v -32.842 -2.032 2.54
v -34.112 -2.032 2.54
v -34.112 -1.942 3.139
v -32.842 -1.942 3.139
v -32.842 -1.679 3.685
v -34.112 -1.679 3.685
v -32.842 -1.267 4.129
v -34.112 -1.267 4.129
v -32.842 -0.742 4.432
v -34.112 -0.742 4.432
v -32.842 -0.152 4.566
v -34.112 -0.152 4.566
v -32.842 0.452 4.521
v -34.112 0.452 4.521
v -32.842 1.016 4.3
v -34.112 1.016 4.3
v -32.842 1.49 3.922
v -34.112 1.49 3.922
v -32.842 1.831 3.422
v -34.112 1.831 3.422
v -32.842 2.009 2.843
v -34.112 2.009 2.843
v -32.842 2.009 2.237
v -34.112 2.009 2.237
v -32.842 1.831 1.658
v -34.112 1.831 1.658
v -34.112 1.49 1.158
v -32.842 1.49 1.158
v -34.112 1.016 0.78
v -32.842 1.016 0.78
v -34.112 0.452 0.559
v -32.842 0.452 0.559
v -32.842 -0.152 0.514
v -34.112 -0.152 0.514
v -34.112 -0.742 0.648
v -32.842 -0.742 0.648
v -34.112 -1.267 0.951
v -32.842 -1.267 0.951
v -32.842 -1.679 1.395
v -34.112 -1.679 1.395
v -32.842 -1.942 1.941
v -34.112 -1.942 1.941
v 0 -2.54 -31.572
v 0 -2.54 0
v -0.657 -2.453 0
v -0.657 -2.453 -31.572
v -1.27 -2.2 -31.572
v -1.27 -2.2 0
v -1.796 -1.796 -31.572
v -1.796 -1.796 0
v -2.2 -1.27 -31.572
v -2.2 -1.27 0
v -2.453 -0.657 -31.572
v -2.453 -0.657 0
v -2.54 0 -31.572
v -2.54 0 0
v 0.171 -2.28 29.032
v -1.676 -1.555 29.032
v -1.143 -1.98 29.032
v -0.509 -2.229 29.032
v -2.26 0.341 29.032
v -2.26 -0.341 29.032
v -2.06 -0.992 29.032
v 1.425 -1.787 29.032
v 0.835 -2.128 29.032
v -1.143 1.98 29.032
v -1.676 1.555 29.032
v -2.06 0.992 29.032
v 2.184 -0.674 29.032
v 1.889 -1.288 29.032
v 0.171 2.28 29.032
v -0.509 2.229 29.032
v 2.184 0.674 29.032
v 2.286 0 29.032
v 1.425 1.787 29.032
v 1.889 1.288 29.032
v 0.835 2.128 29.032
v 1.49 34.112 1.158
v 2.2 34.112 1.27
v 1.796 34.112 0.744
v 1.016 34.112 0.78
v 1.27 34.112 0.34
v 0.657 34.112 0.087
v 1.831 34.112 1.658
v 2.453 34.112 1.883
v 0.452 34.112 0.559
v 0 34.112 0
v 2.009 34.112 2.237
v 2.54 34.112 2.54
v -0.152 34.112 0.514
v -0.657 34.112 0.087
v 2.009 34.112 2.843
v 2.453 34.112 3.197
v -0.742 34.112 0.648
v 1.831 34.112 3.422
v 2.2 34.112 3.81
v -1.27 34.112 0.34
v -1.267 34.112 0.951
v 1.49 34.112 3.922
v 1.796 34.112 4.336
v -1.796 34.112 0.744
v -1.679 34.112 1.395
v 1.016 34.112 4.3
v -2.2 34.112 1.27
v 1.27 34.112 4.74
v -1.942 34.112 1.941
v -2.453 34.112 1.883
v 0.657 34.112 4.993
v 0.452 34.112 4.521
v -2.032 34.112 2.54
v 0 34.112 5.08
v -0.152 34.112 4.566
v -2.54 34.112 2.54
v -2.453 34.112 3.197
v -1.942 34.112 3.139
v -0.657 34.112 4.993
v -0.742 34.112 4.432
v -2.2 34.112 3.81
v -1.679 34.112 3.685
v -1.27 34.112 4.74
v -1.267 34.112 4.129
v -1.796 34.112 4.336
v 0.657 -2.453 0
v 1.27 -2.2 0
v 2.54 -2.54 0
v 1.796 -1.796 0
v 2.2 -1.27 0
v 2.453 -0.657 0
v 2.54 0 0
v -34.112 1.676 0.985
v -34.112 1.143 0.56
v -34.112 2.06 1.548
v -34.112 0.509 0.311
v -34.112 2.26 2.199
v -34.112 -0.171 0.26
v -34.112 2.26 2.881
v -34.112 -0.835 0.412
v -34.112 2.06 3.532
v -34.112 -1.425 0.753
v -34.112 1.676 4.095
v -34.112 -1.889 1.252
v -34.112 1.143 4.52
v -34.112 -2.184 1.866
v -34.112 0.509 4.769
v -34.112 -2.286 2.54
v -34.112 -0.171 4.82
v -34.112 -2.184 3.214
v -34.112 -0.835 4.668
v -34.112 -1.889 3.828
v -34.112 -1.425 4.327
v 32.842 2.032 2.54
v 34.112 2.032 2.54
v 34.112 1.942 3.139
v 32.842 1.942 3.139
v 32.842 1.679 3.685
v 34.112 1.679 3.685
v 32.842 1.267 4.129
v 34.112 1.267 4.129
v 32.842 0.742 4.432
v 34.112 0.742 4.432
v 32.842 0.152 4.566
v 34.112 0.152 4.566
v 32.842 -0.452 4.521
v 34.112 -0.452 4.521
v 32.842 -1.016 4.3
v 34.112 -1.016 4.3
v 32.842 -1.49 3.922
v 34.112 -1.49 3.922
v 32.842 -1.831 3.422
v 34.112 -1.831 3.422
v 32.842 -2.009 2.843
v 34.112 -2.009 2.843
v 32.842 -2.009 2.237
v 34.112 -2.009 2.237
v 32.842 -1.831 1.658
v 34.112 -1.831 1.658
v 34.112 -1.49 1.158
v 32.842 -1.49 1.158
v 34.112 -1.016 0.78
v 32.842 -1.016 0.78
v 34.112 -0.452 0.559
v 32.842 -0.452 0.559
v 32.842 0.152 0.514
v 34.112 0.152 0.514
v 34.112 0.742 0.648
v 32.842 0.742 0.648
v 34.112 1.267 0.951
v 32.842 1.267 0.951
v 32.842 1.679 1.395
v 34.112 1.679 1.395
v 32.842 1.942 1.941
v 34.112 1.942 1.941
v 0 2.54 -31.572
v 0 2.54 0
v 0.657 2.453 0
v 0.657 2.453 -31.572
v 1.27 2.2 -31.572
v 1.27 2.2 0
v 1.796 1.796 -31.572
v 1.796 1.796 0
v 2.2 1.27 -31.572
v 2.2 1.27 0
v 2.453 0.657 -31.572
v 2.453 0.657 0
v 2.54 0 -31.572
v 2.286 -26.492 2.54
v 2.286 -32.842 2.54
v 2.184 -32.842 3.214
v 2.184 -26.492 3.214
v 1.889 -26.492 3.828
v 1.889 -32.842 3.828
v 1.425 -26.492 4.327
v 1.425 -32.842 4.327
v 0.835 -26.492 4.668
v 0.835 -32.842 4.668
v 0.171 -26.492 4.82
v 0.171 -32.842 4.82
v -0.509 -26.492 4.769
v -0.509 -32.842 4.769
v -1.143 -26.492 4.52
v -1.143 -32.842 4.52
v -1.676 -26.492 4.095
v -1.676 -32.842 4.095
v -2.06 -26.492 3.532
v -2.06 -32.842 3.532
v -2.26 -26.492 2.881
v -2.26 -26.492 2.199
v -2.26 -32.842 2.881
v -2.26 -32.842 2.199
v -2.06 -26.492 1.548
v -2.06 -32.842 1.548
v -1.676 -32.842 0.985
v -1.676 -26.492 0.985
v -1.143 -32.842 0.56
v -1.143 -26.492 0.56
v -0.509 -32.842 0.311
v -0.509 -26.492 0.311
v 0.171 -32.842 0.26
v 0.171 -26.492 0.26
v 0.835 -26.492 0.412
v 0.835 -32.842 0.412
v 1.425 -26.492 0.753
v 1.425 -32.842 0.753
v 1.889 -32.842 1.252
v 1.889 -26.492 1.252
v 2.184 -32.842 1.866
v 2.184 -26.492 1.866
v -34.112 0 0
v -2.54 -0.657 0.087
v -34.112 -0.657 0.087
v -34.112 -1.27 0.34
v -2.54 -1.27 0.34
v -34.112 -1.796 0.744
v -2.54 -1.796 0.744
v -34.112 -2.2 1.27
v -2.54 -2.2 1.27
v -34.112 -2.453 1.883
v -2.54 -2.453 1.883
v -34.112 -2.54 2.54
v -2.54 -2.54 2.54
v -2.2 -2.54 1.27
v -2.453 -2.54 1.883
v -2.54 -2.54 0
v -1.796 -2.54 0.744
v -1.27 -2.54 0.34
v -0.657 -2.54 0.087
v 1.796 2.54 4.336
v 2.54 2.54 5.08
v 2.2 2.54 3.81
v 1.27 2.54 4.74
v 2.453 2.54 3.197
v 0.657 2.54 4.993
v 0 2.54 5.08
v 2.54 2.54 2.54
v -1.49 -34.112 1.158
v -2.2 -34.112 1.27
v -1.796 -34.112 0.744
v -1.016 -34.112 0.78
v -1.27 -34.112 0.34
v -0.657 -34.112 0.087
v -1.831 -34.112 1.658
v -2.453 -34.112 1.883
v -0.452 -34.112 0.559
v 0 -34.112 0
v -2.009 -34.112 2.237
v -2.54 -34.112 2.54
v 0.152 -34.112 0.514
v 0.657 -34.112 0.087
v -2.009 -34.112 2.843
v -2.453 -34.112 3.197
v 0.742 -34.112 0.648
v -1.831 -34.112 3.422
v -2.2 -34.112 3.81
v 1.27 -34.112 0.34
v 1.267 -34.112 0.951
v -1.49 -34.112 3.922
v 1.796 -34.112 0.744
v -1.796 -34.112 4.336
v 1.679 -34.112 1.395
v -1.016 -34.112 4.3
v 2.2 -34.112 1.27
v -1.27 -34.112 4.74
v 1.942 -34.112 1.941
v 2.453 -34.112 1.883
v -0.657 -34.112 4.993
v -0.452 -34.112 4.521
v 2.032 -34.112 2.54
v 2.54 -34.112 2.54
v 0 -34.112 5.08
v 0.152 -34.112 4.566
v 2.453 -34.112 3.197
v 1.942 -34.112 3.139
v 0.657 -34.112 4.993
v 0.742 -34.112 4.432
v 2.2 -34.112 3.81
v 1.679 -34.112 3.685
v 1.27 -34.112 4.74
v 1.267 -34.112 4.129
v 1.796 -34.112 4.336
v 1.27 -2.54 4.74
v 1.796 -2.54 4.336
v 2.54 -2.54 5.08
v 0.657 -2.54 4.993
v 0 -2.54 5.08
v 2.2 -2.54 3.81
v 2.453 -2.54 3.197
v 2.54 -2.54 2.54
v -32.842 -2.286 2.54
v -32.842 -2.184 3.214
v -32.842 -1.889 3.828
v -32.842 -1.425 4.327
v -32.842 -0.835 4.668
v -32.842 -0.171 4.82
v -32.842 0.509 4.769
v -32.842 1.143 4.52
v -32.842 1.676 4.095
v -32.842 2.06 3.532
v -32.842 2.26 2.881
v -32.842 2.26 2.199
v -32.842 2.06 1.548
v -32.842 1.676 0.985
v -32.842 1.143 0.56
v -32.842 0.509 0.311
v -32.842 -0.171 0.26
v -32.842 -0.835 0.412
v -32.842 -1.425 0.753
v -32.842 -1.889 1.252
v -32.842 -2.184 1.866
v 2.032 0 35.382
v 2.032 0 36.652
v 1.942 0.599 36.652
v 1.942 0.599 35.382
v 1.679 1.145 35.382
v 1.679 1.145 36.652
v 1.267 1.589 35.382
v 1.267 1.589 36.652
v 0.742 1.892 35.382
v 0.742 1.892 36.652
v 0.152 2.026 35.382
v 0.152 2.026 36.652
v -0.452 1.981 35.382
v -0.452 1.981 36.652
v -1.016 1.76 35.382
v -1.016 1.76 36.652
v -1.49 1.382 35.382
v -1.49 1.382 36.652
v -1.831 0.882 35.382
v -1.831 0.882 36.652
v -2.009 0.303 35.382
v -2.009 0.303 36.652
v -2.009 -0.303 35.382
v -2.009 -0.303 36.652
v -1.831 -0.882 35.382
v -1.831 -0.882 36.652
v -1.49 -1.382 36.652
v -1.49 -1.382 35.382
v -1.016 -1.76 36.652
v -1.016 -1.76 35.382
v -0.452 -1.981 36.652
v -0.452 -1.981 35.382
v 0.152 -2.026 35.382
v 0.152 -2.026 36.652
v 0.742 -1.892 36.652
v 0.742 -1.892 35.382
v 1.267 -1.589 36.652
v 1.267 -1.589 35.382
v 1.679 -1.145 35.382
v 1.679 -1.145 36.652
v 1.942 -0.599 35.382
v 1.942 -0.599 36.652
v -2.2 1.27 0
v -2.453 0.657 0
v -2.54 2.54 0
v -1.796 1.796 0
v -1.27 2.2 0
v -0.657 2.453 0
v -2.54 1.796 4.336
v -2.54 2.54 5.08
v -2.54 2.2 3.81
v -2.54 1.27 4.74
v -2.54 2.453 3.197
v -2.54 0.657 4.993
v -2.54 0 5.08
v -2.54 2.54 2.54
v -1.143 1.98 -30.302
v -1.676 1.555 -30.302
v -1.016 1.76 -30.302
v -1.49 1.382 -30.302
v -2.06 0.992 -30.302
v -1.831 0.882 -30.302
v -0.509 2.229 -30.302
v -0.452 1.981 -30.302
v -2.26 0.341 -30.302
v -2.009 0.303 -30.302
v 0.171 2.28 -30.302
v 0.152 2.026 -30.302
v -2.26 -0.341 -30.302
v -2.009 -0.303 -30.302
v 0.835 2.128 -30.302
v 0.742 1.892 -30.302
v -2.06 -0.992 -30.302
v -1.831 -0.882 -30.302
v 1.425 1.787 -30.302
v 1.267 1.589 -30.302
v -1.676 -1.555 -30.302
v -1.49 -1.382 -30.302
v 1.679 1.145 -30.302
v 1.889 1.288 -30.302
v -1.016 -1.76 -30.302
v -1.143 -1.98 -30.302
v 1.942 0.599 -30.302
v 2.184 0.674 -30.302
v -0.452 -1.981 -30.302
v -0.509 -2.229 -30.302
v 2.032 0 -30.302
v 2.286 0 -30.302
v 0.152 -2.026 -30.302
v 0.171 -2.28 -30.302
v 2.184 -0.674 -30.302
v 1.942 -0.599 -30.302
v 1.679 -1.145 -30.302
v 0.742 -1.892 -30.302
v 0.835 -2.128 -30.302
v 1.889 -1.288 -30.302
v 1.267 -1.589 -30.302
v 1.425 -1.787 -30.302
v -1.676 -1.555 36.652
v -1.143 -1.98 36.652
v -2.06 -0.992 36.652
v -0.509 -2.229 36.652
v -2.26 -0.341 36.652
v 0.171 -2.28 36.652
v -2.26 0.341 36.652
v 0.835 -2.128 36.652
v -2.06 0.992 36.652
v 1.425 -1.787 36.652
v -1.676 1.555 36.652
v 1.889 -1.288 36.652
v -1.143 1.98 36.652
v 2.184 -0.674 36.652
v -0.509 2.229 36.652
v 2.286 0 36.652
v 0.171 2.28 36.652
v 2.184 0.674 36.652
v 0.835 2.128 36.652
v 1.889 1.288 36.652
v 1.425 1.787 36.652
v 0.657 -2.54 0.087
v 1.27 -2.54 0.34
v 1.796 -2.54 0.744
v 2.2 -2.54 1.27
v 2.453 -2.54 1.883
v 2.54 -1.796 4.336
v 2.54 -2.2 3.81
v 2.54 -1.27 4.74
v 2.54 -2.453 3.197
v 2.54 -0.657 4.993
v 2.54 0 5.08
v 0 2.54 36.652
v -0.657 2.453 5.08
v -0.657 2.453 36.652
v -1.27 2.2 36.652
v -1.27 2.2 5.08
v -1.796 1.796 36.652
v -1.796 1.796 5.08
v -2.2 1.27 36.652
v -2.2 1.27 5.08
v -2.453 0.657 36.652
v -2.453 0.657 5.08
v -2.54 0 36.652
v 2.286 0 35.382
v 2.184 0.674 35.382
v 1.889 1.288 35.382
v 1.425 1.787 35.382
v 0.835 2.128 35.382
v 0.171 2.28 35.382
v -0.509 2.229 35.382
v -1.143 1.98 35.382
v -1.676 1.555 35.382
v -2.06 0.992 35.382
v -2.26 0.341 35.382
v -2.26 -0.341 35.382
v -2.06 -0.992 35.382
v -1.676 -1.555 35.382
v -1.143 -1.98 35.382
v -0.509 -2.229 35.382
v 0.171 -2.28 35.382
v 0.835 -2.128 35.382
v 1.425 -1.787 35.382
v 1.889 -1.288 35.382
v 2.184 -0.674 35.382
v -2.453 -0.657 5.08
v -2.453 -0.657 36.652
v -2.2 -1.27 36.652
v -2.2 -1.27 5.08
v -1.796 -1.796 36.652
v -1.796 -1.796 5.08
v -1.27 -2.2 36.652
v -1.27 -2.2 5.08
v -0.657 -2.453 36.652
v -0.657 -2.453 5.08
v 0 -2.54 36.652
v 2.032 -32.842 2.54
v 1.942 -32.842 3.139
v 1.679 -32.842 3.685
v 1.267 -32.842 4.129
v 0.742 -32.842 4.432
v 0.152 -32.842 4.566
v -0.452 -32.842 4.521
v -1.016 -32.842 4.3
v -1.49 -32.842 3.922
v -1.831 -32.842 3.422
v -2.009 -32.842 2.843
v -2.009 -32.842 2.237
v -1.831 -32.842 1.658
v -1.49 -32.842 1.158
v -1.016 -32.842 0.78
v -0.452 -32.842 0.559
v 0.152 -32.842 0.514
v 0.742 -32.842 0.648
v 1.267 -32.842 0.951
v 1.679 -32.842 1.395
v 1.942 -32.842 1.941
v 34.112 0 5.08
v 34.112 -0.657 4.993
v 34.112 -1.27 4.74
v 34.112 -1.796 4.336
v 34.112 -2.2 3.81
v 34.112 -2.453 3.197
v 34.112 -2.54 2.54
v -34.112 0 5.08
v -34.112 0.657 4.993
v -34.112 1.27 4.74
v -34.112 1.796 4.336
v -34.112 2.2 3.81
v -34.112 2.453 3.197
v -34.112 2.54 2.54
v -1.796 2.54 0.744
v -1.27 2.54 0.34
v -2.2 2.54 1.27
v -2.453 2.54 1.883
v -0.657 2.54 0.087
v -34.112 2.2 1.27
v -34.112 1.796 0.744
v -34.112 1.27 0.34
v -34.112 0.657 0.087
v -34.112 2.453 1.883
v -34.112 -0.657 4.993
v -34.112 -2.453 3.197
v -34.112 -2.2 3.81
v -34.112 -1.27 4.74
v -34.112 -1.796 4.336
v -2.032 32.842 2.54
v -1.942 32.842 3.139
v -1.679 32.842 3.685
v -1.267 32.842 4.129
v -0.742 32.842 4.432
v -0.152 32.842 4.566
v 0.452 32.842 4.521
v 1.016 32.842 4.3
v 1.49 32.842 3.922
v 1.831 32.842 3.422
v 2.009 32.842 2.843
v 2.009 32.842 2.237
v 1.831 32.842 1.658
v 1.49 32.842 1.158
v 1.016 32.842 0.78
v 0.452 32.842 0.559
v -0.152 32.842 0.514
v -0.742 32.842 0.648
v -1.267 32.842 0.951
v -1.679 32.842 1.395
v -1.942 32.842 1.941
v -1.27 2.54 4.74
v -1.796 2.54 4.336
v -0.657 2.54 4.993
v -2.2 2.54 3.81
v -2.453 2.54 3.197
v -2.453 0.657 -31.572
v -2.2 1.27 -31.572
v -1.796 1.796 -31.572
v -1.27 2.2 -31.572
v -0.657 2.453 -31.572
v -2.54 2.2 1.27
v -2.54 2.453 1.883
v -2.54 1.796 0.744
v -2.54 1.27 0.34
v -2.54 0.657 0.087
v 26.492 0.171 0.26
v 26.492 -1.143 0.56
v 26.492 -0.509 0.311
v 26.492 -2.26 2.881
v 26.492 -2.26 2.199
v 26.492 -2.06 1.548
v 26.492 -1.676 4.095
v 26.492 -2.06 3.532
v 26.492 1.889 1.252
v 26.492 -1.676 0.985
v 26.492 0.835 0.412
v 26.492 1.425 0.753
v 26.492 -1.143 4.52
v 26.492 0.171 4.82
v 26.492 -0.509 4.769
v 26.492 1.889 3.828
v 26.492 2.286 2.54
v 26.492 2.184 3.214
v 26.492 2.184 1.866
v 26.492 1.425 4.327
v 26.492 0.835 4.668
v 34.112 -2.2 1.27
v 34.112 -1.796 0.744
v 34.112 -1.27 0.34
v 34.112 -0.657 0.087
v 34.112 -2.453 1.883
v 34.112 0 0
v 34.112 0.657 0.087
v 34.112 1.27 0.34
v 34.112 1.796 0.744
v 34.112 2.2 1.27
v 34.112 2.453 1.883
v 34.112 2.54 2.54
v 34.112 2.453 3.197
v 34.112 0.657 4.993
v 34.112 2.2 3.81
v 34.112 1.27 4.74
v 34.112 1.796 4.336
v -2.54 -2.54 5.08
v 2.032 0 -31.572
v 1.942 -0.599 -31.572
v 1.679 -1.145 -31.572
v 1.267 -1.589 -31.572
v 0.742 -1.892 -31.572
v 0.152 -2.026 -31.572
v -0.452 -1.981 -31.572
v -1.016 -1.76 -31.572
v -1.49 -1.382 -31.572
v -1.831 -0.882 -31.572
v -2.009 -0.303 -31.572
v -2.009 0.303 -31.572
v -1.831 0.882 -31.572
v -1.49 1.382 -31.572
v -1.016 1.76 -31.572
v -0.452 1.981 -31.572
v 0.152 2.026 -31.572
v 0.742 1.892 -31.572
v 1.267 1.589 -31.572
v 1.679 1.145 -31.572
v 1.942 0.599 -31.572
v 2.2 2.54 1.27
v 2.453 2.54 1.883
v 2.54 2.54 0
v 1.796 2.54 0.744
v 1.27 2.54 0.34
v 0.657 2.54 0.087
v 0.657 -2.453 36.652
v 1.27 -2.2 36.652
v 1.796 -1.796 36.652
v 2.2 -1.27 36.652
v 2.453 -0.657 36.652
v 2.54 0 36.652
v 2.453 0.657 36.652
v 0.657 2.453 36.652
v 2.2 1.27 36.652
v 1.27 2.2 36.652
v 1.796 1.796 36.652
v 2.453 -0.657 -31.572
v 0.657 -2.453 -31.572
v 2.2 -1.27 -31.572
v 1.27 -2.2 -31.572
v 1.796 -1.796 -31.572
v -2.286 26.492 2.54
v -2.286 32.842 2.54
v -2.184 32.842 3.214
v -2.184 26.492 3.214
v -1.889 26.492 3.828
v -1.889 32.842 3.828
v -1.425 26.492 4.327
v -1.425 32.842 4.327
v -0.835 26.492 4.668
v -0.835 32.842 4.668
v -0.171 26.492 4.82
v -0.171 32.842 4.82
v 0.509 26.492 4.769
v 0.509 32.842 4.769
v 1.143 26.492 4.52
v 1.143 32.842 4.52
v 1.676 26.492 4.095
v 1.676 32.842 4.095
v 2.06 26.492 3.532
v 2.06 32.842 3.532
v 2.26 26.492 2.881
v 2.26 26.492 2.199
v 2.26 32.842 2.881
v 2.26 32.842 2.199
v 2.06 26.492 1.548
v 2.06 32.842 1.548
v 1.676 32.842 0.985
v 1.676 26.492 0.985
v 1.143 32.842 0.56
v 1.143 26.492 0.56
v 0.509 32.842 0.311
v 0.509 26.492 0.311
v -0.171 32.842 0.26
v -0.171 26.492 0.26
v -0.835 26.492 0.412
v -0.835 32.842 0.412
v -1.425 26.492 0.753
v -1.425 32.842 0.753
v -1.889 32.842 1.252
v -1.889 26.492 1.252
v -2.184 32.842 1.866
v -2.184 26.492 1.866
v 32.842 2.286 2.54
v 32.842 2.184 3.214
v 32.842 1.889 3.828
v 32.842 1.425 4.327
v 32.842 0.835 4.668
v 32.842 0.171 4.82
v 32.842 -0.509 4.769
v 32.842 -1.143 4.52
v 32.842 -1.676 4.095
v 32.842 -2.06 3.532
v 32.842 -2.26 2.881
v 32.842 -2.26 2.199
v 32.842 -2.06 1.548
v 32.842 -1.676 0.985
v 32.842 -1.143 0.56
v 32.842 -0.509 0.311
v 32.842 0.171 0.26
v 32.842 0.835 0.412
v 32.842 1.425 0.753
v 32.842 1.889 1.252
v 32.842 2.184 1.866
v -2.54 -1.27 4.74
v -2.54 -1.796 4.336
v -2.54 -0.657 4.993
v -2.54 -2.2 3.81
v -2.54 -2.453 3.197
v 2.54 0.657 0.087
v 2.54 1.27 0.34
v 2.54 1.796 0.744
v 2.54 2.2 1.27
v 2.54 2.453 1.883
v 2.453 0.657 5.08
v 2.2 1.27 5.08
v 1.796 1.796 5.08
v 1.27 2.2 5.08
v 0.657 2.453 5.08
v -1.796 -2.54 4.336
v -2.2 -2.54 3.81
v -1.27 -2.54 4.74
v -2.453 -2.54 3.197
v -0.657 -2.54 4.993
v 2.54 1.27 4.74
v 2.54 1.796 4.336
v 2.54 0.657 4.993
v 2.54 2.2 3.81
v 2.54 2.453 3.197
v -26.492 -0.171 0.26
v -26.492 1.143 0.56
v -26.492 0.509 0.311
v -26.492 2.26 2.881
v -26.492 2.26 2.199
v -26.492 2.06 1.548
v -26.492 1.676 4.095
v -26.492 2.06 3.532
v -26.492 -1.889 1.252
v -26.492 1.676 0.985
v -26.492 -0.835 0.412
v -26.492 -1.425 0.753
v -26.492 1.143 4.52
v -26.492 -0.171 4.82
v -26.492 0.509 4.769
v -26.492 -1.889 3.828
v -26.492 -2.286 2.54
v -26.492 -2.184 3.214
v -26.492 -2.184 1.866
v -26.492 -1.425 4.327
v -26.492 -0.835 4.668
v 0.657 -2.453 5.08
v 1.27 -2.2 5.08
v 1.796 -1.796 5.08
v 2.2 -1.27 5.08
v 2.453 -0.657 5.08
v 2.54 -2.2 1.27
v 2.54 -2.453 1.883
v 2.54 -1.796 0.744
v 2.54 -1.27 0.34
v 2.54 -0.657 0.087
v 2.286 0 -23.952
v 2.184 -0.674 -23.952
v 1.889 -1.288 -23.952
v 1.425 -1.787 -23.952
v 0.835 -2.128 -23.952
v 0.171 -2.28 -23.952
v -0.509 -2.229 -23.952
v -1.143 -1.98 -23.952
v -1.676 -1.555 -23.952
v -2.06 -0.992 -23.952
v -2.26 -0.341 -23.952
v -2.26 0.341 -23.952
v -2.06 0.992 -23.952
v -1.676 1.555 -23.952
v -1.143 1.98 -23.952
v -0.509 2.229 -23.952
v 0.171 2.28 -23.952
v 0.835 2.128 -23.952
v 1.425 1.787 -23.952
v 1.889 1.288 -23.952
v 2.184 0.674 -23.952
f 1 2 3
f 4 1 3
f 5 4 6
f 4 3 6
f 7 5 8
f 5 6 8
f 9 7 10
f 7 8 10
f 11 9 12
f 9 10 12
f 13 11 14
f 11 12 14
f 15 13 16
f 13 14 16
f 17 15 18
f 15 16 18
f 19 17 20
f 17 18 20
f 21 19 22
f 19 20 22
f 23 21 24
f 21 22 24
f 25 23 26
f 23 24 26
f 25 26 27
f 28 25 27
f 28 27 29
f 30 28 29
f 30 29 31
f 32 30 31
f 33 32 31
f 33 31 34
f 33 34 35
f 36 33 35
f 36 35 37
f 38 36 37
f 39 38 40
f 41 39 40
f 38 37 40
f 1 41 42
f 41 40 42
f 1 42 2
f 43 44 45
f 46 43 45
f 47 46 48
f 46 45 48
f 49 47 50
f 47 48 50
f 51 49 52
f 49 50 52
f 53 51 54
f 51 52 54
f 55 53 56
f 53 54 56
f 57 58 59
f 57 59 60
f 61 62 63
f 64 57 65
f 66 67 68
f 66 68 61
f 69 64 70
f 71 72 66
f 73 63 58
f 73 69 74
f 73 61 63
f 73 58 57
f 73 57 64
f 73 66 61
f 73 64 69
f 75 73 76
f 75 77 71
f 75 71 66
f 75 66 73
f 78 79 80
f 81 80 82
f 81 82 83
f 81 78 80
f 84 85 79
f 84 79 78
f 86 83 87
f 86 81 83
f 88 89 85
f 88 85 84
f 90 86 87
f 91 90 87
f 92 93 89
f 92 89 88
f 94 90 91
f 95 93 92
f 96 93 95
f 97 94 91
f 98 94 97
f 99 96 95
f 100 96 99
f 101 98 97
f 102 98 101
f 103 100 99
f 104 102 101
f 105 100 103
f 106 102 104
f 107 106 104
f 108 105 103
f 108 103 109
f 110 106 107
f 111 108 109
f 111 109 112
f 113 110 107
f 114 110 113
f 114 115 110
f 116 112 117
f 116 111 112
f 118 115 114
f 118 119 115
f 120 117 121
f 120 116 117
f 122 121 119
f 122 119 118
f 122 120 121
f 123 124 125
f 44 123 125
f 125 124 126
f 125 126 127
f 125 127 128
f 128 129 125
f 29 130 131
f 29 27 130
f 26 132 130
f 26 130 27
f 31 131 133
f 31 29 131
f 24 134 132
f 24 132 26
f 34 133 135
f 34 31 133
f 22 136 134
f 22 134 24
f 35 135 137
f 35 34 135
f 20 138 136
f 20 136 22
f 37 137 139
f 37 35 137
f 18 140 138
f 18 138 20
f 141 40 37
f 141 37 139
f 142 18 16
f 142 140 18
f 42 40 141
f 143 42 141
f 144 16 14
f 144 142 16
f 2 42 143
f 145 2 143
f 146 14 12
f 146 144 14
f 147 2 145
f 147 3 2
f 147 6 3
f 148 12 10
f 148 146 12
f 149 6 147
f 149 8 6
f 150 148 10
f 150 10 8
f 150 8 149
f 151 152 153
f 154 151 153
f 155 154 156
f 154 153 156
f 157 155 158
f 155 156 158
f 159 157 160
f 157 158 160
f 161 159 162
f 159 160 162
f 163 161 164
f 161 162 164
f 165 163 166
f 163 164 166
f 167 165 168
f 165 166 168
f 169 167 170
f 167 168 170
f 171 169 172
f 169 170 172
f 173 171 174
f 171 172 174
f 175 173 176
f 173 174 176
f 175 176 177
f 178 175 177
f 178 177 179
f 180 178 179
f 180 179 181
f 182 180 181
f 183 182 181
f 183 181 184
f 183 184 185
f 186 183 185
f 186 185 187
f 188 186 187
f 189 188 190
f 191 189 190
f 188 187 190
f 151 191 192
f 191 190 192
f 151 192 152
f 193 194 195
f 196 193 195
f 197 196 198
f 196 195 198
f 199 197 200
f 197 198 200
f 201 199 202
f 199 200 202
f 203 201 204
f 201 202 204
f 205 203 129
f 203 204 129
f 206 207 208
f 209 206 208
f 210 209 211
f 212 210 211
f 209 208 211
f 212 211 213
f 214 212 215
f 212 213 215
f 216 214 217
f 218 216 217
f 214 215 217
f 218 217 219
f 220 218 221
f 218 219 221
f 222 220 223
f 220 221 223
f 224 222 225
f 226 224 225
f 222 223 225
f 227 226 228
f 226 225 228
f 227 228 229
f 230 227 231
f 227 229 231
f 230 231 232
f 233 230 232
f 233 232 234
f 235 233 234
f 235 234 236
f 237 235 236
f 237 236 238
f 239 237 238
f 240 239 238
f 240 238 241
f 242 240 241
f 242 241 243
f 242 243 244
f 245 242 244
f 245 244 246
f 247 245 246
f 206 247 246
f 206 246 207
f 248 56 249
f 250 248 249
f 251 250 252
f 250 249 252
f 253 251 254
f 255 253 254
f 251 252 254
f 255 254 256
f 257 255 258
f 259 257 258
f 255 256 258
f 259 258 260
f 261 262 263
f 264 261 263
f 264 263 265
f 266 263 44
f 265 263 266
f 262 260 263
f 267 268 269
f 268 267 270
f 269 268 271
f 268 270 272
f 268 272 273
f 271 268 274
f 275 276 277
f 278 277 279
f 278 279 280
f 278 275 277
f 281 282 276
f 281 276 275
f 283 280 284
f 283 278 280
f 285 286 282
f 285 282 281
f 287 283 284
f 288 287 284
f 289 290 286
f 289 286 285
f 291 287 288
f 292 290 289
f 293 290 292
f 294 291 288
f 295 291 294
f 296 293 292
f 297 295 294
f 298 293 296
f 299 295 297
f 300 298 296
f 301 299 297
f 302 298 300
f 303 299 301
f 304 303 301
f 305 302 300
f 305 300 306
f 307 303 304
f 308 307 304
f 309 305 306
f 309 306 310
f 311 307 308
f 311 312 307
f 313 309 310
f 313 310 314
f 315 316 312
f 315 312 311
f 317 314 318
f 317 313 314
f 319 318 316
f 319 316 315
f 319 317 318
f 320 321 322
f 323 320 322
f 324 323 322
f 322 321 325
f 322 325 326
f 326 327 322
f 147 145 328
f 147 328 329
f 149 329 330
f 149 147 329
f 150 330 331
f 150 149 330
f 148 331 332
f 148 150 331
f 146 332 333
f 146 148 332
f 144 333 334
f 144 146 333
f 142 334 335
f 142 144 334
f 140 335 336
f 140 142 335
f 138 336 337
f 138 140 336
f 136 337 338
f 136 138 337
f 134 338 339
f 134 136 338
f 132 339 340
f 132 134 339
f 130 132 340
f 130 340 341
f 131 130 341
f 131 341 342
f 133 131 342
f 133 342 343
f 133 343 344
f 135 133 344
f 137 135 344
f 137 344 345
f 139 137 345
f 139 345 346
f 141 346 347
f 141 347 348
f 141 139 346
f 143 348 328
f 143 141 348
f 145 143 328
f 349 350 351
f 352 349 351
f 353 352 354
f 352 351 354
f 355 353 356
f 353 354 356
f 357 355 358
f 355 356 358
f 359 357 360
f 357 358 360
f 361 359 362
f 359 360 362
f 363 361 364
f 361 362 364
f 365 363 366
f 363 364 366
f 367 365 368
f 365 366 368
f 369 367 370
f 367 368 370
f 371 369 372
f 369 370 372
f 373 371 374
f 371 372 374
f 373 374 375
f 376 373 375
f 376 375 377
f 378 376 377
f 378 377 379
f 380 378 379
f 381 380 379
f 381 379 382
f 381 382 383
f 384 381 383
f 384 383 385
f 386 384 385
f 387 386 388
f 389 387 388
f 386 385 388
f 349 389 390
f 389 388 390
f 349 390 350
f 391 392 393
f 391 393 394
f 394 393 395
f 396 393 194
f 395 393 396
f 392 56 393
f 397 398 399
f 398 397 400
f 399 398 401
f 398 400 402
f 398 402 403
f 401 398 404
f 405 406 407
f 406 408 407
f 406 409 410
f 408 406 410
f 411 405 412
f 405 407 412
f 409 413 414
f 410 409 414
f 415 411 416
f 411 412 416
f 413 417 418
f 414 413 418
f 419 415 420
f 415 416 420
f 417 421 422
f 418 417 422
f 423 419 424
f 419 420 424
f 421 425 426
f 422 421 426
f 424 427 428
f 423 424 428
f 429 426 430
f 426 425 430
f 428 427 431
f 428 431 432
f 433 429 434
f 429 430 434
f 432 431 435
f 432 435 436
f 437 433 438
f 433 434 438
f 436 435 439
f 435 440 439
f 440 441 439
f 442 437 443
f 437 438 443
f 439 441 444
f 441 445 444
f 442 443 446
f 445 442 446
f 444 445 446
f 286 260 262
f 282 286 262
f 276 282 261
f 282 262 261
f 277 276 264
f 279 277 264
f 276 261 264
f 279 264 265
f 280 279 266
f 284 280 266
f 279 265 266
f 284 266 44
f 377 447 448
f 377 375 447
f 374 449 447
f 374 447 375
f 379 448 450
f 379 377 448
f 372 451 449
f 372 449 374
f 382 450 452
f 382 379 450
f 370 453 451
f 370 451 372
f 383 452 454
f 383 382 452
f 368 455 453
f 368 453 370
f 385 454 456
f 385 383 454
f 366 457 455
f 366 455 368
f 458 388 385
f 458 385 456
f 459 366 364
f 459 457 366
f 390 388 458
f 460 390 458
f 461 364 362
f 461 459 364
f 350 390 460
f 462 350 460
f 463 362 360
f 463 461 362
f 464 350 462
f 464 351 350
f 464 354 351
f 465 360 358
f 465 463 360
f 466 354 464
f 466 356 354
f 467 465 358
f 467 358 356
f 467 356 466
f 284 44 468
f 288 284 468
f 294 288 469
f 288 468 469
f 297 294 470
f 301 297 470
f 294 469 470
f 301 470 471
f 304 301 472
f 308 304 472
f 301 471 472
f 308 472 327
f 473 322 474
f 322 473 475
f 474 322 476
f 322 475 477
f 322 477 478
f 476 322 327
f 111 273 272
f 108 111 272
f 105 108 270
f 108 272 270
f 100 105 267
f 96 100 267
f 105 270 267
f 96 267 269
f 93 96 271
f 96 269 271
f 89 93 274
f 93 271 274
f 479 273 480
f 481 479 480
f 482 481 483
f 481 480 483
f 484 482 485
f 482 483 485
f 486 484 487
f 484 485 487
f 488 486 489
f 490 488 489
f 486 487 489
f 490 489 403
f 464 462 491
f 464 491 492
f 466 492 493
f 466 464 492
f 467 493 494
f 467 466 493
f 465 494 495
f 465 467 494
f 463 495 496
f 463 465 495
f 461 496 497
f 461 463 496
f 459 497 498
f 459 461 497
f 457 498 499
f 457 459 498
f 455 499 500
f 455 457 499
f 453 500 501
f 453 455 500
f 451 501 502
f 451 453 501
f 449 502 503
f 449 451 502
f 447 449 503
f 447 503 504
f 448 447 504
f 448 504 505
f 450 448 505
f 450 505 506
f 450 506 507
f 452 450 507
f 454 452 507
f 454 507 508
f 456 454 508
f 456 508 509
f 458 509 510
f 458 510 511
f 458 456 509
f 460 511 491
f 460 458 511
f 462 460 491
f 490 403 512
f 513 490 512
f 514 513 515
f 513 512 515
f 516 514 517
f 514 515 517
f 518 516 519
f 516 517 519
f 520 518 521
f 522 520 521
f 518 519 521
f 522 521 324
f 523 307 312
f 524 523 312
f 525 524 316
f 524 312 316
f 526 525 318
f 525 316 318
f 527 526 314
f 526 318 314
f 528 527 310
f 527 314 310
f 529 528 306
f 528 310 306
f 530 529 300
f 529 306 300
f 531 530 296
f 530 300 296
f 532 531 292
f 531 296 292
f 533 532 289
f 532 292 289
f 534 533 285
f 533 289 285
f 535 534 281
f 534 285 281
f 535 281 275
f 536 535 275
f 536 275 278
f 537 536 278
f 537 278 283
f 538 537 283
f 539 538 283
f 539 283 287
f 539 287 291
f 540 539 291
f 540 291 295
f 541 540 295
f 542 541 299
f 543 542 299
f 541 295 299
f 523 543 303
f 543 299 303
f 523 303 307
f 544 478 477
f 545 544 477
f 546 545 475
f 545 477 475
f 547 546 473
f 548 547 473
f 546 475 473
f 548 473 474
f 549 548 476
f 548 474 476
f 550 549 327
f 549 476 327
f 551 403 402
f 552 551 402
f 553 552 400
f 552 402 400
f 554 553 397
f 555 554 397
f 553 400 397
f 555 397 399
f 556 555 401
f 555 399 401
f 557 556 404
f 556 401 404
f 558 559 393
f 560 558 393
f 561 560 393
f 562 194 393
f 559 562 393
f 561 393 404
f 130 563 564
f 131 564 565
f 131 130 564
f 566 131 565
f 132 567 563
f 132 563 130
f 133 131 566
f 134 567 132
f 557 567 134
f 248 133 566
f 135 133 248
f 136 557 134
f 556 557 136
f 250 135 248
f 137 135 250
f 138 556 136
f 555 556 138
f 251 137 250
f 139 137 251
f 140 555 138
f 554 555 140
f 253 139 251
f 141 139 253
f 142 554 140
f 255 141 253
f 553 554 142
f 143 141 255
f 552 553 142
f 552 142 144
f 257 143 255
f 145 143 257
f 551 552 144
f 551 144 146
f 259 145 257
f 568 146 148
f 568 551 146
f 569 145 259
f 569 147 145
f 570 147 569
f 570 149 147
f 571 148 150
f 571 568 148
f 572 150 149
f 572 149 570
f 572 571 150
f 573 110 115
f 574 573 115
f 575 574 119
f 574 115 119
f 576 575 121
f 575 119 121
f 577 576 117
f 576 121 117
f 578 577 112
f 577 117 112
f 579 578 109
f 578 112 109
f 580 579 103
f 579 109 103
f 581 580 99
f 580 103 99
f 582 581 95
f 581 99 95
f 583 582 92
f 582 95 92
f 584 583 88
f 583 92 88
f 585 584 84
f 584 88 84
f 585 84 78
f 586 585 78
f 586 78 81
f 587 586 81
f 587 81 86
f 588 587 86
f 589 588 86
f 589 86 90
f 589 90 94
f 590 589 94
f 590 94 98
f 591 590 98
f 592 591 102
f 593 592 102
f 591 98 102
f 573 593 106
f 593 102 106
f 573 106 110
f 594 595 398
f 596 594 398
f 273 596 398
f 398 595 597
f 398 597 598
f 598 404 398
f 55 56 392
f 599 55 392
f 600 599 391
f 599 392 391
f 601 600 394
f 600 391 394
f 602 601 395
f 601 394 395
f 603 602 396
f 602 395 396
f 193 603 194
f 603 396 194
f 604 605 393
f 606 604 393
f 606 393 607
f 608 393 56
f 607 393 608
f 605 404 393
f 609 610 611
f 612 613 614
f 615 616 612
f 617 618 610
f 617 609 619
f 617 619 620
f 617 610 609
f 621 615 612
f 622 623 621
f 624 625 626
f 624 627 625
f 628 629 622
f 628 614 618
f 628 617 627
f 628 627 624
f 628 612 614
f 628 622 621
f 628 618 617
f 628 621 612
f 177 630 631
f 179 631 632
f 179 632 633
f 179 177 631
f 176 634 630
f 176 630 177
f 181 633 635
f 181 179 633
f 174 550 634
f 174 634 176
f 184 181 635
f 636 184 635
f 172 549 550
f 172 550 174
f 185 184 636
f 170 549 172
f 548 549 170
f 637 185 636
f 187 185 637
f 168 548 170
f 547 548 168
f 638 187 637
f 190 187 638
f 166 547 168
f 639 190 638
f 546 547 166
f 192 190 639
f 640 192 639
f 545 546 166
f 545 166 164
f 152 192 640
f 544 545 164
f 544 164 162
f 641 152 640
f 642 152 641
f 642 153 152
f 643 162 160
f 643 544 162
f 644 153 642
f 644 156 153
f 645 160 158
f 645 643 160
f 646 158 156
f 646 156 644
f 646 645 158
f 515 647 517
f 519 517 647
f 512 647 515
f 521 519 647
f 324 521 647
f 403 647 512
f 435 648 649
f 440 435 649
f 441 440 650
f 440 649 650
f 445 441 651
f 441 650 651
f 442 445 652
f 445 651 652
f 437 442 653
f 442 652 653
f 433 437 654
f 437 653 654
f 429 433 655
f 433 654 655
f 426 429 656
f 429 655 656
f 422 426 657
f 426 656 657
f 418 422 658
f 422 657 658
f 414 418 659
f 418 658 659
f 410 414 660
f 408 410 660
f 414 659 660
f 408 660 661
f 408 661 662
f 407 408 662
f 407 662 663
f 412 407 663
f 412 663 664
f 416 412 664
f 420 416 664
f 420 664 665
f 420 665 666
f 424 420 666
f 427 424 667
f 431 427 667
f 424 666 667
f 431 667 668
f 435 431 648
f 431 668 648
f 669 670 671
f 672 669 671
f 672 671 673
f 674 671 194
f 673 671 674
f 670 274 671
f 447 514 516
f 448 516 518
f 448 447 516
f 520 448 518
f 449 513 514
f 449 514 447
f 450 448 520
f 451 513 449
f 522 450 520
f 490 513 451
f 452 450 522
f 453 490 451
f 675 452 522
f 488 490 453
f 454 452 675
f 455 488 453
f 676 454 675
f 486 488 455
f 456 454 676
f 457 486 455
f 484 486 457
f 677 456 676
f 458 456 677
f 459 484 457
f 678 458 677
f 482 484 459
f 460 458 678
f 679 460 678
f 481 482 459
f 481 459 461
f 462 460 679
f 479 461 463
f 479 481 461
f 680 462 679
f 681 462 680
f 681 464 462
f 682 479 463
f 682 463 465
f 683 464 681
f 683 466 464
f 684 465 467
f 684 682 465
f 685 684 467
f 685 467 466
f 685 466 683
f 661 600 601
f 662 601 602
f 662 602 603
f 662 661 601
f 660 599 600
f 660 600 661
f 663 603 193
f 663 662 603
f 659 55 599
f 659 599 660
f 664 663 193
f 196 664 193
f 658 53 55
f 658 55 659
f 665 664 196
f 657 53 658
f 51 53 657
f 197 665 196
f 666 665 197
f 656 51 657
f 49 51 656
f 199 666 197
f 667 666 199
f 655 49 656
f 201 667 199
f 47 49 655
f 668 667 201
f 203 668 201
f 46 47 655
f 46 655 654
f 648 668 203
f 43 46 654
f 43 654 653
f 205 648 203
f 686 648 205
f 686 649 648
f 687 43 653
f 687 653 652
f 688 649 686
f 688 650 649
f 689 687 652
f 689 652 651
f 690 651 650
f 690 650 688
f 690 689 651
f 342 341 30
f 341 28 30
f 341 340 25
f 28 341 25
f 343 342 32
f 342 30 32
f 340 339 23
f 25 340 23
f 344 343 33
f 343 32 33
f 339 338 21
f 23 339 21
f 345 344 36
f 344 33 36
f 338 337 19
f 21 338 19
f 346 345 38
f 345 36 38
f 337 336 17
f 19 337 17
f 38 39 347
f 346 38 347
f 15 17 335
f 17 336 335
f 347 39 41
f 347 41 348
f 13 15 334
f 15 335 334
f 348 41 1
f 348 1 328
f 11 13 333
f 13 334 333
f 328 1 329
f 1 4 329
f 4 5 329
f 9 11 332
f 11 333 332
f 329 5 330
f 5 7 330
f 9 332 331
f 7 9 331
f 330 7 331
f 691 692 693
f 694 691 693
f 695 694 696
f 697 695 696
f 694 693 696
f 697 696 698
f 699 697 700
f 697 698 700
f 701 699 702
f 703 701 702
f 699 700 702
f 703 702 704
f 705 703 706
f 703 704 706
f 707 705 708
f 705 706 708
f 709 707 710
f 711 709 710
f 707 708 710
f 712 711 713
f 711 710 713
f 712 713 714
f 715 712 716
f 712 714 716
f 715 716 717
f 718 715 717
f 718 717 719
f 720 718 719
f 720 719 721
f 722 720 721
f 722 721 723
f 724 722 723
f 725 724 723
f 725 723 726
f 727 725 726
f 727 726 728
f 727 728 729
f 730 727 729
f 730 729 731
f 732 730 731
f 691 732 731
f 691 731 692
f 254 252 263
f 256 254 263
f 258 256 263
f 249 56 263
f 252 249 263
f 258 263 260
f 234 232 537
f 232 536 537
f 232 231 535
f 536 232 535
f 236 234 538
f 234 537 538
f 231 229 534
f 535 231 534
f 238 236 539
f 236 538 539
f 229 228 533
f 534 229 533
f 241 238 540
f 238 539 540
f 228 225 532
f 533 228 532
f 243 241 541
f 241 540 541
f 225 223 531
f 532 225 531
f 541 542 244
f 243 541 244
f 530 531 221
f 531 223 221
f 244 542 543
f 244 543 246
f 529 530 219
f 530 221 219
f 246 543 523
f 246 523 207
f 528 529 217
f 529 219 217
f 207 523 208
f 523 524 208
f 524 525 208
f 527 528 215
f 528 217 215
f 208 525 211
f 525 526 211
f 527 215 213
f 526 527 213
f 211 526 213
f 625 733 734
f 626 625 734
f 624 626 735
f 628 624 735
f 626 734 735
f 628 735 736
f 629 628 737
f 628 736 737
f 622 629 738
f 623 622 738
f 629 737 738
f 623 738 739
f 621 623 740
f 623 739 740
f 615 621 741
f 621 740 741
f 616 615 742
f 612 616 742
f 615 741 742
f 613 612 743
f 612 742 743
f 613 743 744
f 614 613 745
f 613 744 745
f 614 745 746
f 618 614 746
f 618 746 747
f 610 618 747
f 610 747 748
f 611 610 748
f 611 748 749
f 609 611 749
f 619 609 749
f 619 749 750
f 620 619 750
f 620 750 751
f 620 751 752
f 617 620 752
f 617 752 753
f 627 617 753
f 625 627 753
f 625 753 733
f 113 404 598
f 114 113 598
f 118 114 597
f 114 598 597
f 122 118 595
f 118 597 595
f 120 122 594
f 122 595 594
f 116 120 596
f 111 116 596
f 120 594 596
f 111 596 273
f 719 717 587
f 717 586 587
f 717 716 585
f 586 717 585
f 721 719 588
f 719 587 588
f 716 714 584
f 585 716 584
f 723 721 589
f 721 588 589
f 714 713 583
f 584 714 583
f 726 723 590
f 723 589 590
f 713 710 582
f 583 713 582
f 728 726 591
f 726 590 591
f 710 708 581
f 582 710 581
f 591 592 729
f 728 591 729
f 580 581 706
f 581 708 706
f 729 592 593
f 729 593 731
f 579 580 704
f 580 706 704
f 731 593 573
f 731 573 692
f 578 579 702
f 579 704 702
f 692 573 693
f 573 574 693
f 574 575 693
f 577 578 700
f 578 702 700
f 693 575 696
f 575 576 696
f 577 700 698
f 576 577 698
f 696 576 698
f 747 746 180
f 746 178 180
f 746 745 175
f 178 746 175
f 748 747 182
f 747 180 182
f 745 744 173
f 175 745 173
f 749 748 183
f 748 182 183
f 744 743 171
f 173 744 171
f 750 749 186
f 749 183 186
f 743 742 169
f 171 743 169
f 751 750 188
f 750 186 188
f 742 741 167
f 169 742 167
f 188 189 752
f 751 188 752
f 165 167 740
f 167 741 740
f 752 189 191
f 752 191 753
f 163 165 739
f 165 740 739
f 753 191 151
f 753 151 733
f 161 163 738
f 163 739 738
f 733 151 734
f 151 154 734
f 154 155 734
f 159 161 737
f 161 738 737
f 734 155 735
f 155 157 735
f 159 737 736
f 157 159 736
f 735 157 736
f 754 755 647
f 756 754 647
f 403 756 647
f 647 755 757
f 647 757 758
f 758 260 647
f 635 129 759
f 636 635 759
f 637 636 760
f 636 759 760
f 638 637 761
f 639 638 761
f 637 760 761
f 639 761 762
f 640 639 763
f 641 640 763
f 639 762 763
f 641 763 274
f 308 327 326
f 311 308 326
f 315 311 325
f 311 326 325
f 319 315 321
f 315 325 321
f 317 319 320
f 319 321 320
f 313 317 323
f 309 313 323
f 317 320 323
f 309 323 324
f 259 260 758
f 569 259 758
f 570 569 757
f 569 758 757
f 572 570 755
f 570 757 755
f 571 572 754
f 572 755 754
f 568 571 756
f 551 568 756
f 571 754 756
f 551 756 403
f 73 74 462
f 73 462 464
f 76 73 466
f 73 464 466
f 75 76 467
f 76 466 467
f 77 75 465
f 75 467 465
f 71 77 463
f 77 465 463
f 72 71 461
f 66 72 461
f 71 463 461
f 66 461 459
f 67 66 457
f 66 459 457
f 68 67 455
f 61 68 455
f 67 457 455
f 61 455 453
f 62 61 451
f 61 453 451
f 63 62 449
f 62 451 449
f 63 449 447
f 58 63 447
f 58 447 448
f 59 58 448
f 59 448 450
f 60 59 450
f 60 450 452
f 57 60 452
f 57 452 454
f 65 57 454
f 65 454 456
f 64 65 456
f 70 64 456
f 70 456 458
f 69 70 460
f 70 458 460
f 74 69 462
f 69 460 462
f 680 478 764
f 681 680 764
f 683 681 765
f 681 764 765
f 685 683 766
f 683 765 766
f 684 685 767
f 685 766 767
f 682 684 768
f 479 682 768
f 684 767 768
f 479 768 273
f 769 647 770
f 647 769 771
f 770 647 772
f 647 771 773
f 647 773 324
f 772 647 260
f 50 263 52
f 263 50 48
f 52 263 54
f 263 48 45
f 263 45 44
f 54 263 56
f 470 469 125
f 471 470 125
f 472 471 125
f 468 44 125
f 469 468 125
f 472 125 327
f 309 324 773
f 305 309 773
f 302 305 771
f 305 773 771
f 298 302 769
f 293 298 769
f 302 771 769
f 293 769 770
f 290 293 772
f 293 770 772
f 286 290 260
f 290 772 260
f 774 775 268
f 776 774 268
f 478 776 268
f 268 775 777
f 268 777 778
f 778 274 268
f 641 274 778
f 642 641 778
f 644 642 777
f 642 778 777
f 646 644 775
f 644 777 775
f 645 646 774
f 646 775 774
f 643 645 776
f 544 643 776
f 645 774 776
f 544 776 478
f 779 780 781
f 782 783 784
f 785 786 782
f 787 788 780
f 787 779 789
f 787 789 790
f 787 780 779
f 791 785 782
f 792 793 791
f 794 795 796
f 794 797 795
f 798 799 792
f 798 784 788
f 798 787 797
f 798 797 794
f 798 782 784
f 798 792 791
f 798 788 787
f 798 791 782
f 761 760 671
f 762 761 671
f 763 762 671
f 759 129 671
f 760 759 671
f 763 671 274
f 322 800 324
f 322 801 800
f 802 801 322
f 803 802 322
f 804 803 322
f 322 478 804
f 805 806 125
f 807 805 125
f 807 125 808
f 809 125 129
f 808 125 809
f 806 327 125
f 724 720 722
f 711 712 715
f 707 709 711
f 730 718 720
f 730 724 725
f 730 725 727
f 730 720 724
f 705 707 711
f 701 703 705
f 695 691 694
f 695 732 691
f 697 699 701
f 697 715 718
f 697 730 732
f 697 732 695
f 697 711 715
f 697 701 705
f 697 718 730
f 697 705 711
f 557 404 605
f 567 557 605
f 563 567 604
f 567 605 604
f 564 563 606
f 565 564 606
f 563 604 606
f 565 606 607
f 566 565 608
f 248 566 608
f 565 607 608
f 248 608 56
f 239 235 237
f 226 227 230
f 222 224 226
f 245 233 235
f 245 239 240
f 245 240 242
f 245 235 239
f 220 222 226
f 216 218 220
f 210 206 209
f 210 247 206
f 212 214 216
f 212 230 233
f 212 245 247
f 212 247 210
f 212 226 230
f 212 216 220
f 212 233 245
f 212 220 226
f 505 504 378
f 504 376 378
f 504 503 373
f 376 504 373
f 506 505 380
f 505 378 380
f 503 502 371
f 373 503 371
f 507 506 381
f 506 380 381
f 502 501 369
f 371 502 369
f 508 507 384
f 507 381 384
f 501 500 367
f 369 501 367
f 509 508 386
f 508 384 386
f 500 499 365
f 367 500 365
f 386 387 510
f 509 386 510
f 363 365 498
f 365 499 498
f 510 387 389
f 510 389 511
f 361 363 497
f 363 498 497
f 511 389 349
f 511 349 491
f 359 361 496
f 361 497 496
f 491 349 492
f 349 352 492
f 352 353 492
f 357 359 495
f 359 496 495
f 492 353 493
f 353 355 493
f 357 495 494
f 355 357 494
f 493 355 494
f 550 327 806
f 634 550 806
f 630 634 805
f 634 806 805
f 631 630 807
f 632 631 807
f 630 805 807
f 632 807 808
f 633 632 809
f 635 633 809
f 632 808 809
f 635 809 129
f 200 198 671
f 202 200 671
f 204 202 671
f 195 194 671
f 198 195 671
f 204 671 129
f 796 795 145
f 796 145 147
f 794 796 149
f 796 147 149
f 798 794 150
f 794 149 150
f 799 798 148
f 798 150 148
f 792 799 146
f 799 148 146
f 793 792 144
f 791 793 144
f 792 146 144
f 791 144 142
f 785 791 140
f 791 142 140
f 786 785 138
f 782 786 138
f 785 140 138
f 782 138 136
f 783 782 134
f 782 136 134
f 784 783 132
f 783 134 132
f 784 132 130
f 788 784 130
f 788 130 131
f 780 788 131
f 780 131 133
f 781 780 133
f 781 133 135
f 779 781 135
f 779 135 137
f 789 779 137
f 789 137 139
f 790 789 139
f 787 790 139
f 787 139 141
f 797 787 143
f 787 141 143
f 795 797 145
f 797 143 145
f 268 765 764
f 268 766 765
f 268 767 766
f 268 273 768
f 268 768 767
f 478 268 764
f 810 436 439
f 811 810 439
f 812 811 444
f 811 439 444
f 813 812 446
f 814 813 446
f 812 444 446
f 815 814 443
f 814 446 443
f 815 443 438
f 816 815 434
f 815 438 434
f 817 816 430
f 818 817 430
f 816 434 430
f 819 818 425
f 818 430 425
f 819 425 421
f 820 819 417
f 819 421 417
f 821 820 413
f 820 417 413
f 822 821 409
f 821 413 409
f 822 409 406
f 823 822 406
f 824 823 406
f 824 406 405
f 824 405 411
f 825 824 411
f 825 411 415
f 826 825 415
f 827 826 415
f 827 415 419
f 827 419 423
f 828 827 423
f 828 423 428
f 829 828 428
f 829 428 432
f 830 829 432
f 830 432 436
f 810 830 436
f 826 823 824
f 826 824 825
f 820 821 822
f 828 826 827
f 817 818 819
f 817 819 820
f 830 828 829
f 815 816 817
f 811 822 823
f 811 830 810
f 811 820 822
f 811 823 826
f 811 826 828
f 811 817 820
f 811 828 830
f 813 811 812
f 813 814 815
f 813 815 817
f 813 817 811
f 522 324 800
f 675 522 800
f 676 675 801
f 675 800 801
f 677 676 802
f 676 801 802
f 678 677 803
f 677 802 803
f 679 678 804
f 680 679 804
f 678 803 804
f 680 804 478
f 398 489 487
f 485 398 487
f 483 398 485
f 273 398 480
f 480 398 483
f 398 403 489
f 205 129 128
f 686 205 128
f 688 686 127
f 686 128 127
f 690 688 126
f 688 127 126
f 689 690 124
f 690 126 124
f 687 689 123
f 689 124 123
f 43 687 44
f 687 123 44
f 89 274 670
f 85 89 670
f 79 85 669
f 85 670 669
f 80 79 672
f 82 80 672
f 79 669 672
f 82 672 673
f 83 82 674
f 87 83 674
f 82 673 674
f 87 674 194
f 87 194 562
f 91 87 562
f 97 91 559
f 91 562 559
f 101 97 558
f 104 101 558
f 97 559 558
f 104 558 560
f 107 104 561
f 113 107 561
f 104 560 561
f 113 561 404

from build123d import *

# Parameters (mm, degrees)
F0_W      = 2.54
F0_H      = 2.54
F1_DEPTH  = 5.08
F8_DEPTH  = 31.5722
F9_R      = 2.286
F9_R_2    = 2.032
F10_DEPTH = 7.62
F11_DEPTH = 1.27
F12_DEPTH = 31.5722
F13_R     = 2.286
F13_R_2   = 2.032
F14_DEPTH = 7.62
F15_DEPTH = 1.27
F16_DEPTH = 31.5722
F17_R     = 2.286
F17_R_2   = 2.032
F18_DEPTH = 7.62
F19_DEPTH = 1.27
F20_DEPTH = 31.5722
F21_R     = 2.286
F21_R_2   = 2.032
F22_DEPTH = 7.62
F23_DEPTH = 1.27
F24_DEPTH = 31.5722
F25_R     = 2.286
F25_R_2   = 2.032
F26_DEPTH = 7.62
F27_DEPTH = 1.27
F28_DEPTH = 31.5722
F29_R     = 2.286
F29_R_2   = 2.032
F30_DEPTH = 7.62
F31_DEPTH = 1.27


with BuildPart() as f1:
    # F0 (on Top) → F1 (new body)
    with BuildSketch(Plane.XY):
        with Locations((-1.27, 1.27)):
            Rectangle(F0_W, F0_H)
        with Locations((1.27, 1.27)):
            Rectangle(F0_W, F0_H)
        Polygon((2.54, -2.54), (2.54, 0), (0, -2.54), align=None)
        Polygon((2.54, 0), (0, 0), (0, -2.54), align=None)
        with Locations((-1.27, -1.27)):
            Rectangle(F0_W, F0_H)
    extrude(amount=F1_DEPTH)

    # F7 (on face) → F8 (join)
    with BuildSketch(Plane(origin=(0, 0, 0), x_dir=(1, 0, 0), z_dir=(0, 0, -1))):
        with BuildLine():
            ThreePointArc((0, -2.54), (1.7960512242, -1.7960512242), (2.54, 0))
            ThreePointArc((2.54, 0), (1.7960512242, 1.7960512242), (0, 2.54))
            ThreePointArc((0, 2.54), (-1.7960512242, 1.7960512242), (-2.54, 0))
            ThreePointArc((-2.54, 0), (-1.7960512242, -1.7960512242), (0, -2.54))
        make_face()
    extrude(amount=F8_DEPTH)

    # F9 (on face) → F10 (cut)
    with BuildSketch(Plane(origin=(0, 0, -31.5722), x_dir=(1, 0, 0), z_dir=(0, 0, -1))):
        Circle(F9_R)
        Circle(F9_R_2, mode=Mode.SUBTRACT)
        Circle(F9_R_2)
    extrude(amount=-F10_DEPTH, mode=Mode.SUBTRACT)

    # F9 (on face) → F11 (join)
    with BuildSketch(Plane(origin=(0, 0, -31.5722), x_dir=(1, 0, 0), z_dir=(0, 0, -1))):
        Circle(F9_R)
        Circle(F9_R_2, mode=Mode.SUBTRACT)
    extrude(amount=-F11_DEPTH)

    # F6 (on face) → F12 (join)
    with BuildSketch(Plane.YZ.offset(2.54)):
        with BuildLine():
            ThreePointArc((0, 0), (1.7960512242, 0.7439487758), (2.54, 2.54))
            ThreePointArc((2.54, 2.54), (1.7960512242, 4.3360512242), (0, 5.08))
            ThreePointArc((0, 5.08), (-1.7960512242, 4.3360512242), (-2.54, 2.54))
            ThreePointArc((-2.54, 2.54), (-1.7960512242, 0.7439487758), (0, 0))
        make_face()
    extrude(amount=F12_DEPTH)

    # F13 (on face) → F14 (cut)
    with BuildSketch(Plane.YZ.offset(34.1122)):
        with Locations((0, 2.54)):
            Circle(F13_R)
        with Locations((0, 2.54)):
            Circle(F13_R_2, mode=Mode.SUBTRACT)
        with Locations((0, 2.54)):
            Circle(F13_R_2)
    extrude(amount=-F14_DEPTH, mode=Mode.SUBTRACT)

    # F13 (on face) → F15 (join)
    with BuildSketch(Plane.YZ.offset(34.1122)):
        with Locations((0, 2.54)):
            Circle(F13_R)
        with Locations((0, 2.54)):
            Circle(F13_R_2, mode=Mode.SUBTRACT)
    extrude(amount=-F15_DEPTH)

    # F3 (on face) → F16 (join)
    with BuildSketch(Plane.XZ.offset(2.54)):
        with BuildLine():
            Line((0, 2.54), (0, 5.08))
            ThreePointArc((0, 5.08), (-1.7960512242, 4.3360512242), (-2.54, 2.54))
            Line((-2.54, 2.54), (0, 2.54))
        make_face()
        with BuildLine():
            ThreePointArc((2.54, 2.54), (1.7960512242, 4.3360512242), (0, 5.08))
            Line((0, 5.08), (0, 2.54))
            Line((0, 2.54), (2.54, 2.54))
        make_face()
        with BuildLine():
            Line((2.54, 2.54), (0, 2.54))
            Line((0, 2.54), (0, 0))
            ThreePointArc((0, 0), (1.7960512242, 0.7439487758), (2.54, 2.54))
        make_face()
        Polygon((0, 0), (0, 2.54), (-2.54, 2.54), align=None)
        with BuildLine():
            Line((0, 0), (-2.54, 2.54))
            ThreePointArc((-2.54, 2.54), (-1.7960512242, 0.7439487758), (0, 0))
        make_face()
    extrude(amount=F16_DEPTH)

    # F17 (on face) → F18 (cut)
    with BuildSketch(Plane.XZ.offset(34.1122)):
        with Locations((0, 2.54)):
            Circle(F17_R)
        with Locations((0, 2.54)):
            Circle(F17_R_2, mode=Mode.SUBTRACT)
        with Locations((0, 2.54)):
            Circle(F17_R_2)
    extrude(amount=-F18_DEPTH, mode=Mode.SUBTRACT)

    # F17 (on face) → F19 (join)
    with BuildSketch(Plane.XZ.offset(34.1122)):
        with Locations((0, 2.54)):
            Circle(F17_R)
        with Locations((0, 2.54)):
            Circle(F17_R_2, mode=Mode.SUBTRACT)
    extrude(amount=-F19_DEPTH)

    # F4 (on face) → F20 (join)
    with BuildSketch(Plane(origin=(0, 2.54, 0), x_dir=(-1, 0, 0), z_dir=(0, 1, 0))):
        with BuildLine():
            ThreePointArc((0, 0), (1.7960512242, 0.7439487758), (2.54, 2.54))
            ThreePointArc((2.54, 2.54), (1.7960512242, 4.3360512242), (0, 5.08))
            ThreePointArc((0, 5.08), (-1.7960512242, 4.3360512242), (-2.54, 2.54))
            ThreePointArc((-2.54, 2.54), (-1.7960512242, 0.7439487758), (0, 0))
        make_face()
    extrude(amount=F20_DEPTH)

    # F21 (on face) → F22 (cut)
    with BuildSketch(Plane(origin=(0, 34.1122, 0), x_dir=(-1, 0, 0), z_dir=(0, 1, 0))):
        with Locations((0, 2.54)):
            Circle(F21_R)
        with Locations((0, 2.54)):
            Circle(F21_R_2, mode=Mode.SUBTRACT)
        with Locations((0, 2.54)):
            Circle(F21_R_2)
    extrude(amount=-F22_DEPTH, mode=Mode.SUBTRACT)

    # F21 (on face) → F23 (join)
    with BuildSketch(Plane(origin=(0, 34.1122, 0), x_dir=(-1, 0, 0), z_dir=(0, 1, 0))):
        with Locations((0, 2.54)):
            Circle(F21_R)
        with Locations((0, 2.54)):
            Circle(F21_R_2, mode=Mode.SUBTRACT)
    extrude(amount=-F23_DEPTH)

    # F2 (on face) → F24 (join)
    with BuildSketch(Plane.XY.offset(5.08)):
        with BuildLine():
            ThreePointArc((0, -2.54), (1.7960512242, -1.7960512242), (2.54, 0))
            ThreePointArc((2.54, 0), (1.7960512242, 1.7960512242), (0, 2.54))
            ThreePointArc((0, 2.54), (-1.7960512242, 1.7960512242), (-2.54, 0))
            ThreePointArc((-2.54, 0), (-1.7960512242, -1.7960512242), (0, -2.54))
        make_face()
    extrude(amount=F24_DEPTH)

    # F25 (on face) → F26 (cut)
    with BuildSketch(Plane.XY.offset(36.6522)):
        Circle(F25_R)
        Circle(F25_R_2, mode=Mode.SUBTRACT)
        Circle(F25_R_2)
    extrude(amount=-F26_DEPTH, mode=Mode.SUBTRACT)

    # F5 (on face) → F28 (join)
    with BuildSketch(Plane(origin=(-2.54, 0, 0), x_dir=(0, -1, 0), z_dir=(-1, 0, 0))):
        Polygon((0, 5.08), (0, 2.54), (2.54, 2.54), align=None)
        with BuildLine():
            ThreePointArc((2.54, 2.54), (1.7960512242, 4.3360512242), (0, 5.08))
            Line((0, 5.08), (2.54, 2.54))
        make_face()
        with BuildLine():
            Line((2.54, 2.54), (0, 2.54))
            Line((0, 2.54), (0, 0))
            ThreePointArc((0, 0), (1.7960512242, 0.7439487758), (2.54, 2.54))
        make_face()
        with BuildLine():
            ThreePointArc((0, 5.08), (-1.7960512242, 4.3360512242), (-2.54, 2.54))
            Line((-2.54, 2.54), (0, 2.54))
            Line((0, 2.54), (0, 5.08))
        make_face()
        with BuildLine():
            Line((0, 2.54), (-2.54, 2.54))
            ThreePointArc((-2.54, 2.54), (-1.7960512242, 0.7439487758), (0, 0))
            Line((0, 0), (0, 2.54))
        make_face()
    extrude(amount=F28_DEPTH)

    # F29 (on face) → F30 (cut)
    with BuildSketch(Plane(origin=(-34.1122, 0, 0), x_dir=(0, -1, 0), z_dir=(-1, 0, 0))):
        with Locations((0, 2.54)):
            Circle(F29_R)
        with Locations((0, 2.54)):
            Circle(F29_R_2, mode=Mode.SUBTRACT)
        with Locations((0, 2.54)):
            Circle(F29_R_2)
    extrude(amount=-F30_DEPTH, mode=Mode.SUBTRACT)


with BuildPart() as f27:
    # F25 (on face) → F27 (new body)
    with BuildSketch(Plane.XY.offset(36.6522)):
        Circle(F25_R)
        Circle(F25_R_2, mode=Mode.SUBTRACT)
    extrude(amount=-F27_DEPTH)


with BuildPart() as f31:
    # F29 (on face) → F31 (new body)
    with BuildSketch(Plane(origin=(-34.1122, 0, 0), x_dir=(0, -1, 0), z_dir=(-1, 0, 0))):
        with Locations((0, 2.54)):
            Circle(F29_R)
        with Locations((0, 2.54)):
            Circle(F29_R_2, mode=Mode.SUBTRACT)
    extrude(amount=-F31_DEPTH)


solid = Compound([f1.part, f27.part, f31.part])
